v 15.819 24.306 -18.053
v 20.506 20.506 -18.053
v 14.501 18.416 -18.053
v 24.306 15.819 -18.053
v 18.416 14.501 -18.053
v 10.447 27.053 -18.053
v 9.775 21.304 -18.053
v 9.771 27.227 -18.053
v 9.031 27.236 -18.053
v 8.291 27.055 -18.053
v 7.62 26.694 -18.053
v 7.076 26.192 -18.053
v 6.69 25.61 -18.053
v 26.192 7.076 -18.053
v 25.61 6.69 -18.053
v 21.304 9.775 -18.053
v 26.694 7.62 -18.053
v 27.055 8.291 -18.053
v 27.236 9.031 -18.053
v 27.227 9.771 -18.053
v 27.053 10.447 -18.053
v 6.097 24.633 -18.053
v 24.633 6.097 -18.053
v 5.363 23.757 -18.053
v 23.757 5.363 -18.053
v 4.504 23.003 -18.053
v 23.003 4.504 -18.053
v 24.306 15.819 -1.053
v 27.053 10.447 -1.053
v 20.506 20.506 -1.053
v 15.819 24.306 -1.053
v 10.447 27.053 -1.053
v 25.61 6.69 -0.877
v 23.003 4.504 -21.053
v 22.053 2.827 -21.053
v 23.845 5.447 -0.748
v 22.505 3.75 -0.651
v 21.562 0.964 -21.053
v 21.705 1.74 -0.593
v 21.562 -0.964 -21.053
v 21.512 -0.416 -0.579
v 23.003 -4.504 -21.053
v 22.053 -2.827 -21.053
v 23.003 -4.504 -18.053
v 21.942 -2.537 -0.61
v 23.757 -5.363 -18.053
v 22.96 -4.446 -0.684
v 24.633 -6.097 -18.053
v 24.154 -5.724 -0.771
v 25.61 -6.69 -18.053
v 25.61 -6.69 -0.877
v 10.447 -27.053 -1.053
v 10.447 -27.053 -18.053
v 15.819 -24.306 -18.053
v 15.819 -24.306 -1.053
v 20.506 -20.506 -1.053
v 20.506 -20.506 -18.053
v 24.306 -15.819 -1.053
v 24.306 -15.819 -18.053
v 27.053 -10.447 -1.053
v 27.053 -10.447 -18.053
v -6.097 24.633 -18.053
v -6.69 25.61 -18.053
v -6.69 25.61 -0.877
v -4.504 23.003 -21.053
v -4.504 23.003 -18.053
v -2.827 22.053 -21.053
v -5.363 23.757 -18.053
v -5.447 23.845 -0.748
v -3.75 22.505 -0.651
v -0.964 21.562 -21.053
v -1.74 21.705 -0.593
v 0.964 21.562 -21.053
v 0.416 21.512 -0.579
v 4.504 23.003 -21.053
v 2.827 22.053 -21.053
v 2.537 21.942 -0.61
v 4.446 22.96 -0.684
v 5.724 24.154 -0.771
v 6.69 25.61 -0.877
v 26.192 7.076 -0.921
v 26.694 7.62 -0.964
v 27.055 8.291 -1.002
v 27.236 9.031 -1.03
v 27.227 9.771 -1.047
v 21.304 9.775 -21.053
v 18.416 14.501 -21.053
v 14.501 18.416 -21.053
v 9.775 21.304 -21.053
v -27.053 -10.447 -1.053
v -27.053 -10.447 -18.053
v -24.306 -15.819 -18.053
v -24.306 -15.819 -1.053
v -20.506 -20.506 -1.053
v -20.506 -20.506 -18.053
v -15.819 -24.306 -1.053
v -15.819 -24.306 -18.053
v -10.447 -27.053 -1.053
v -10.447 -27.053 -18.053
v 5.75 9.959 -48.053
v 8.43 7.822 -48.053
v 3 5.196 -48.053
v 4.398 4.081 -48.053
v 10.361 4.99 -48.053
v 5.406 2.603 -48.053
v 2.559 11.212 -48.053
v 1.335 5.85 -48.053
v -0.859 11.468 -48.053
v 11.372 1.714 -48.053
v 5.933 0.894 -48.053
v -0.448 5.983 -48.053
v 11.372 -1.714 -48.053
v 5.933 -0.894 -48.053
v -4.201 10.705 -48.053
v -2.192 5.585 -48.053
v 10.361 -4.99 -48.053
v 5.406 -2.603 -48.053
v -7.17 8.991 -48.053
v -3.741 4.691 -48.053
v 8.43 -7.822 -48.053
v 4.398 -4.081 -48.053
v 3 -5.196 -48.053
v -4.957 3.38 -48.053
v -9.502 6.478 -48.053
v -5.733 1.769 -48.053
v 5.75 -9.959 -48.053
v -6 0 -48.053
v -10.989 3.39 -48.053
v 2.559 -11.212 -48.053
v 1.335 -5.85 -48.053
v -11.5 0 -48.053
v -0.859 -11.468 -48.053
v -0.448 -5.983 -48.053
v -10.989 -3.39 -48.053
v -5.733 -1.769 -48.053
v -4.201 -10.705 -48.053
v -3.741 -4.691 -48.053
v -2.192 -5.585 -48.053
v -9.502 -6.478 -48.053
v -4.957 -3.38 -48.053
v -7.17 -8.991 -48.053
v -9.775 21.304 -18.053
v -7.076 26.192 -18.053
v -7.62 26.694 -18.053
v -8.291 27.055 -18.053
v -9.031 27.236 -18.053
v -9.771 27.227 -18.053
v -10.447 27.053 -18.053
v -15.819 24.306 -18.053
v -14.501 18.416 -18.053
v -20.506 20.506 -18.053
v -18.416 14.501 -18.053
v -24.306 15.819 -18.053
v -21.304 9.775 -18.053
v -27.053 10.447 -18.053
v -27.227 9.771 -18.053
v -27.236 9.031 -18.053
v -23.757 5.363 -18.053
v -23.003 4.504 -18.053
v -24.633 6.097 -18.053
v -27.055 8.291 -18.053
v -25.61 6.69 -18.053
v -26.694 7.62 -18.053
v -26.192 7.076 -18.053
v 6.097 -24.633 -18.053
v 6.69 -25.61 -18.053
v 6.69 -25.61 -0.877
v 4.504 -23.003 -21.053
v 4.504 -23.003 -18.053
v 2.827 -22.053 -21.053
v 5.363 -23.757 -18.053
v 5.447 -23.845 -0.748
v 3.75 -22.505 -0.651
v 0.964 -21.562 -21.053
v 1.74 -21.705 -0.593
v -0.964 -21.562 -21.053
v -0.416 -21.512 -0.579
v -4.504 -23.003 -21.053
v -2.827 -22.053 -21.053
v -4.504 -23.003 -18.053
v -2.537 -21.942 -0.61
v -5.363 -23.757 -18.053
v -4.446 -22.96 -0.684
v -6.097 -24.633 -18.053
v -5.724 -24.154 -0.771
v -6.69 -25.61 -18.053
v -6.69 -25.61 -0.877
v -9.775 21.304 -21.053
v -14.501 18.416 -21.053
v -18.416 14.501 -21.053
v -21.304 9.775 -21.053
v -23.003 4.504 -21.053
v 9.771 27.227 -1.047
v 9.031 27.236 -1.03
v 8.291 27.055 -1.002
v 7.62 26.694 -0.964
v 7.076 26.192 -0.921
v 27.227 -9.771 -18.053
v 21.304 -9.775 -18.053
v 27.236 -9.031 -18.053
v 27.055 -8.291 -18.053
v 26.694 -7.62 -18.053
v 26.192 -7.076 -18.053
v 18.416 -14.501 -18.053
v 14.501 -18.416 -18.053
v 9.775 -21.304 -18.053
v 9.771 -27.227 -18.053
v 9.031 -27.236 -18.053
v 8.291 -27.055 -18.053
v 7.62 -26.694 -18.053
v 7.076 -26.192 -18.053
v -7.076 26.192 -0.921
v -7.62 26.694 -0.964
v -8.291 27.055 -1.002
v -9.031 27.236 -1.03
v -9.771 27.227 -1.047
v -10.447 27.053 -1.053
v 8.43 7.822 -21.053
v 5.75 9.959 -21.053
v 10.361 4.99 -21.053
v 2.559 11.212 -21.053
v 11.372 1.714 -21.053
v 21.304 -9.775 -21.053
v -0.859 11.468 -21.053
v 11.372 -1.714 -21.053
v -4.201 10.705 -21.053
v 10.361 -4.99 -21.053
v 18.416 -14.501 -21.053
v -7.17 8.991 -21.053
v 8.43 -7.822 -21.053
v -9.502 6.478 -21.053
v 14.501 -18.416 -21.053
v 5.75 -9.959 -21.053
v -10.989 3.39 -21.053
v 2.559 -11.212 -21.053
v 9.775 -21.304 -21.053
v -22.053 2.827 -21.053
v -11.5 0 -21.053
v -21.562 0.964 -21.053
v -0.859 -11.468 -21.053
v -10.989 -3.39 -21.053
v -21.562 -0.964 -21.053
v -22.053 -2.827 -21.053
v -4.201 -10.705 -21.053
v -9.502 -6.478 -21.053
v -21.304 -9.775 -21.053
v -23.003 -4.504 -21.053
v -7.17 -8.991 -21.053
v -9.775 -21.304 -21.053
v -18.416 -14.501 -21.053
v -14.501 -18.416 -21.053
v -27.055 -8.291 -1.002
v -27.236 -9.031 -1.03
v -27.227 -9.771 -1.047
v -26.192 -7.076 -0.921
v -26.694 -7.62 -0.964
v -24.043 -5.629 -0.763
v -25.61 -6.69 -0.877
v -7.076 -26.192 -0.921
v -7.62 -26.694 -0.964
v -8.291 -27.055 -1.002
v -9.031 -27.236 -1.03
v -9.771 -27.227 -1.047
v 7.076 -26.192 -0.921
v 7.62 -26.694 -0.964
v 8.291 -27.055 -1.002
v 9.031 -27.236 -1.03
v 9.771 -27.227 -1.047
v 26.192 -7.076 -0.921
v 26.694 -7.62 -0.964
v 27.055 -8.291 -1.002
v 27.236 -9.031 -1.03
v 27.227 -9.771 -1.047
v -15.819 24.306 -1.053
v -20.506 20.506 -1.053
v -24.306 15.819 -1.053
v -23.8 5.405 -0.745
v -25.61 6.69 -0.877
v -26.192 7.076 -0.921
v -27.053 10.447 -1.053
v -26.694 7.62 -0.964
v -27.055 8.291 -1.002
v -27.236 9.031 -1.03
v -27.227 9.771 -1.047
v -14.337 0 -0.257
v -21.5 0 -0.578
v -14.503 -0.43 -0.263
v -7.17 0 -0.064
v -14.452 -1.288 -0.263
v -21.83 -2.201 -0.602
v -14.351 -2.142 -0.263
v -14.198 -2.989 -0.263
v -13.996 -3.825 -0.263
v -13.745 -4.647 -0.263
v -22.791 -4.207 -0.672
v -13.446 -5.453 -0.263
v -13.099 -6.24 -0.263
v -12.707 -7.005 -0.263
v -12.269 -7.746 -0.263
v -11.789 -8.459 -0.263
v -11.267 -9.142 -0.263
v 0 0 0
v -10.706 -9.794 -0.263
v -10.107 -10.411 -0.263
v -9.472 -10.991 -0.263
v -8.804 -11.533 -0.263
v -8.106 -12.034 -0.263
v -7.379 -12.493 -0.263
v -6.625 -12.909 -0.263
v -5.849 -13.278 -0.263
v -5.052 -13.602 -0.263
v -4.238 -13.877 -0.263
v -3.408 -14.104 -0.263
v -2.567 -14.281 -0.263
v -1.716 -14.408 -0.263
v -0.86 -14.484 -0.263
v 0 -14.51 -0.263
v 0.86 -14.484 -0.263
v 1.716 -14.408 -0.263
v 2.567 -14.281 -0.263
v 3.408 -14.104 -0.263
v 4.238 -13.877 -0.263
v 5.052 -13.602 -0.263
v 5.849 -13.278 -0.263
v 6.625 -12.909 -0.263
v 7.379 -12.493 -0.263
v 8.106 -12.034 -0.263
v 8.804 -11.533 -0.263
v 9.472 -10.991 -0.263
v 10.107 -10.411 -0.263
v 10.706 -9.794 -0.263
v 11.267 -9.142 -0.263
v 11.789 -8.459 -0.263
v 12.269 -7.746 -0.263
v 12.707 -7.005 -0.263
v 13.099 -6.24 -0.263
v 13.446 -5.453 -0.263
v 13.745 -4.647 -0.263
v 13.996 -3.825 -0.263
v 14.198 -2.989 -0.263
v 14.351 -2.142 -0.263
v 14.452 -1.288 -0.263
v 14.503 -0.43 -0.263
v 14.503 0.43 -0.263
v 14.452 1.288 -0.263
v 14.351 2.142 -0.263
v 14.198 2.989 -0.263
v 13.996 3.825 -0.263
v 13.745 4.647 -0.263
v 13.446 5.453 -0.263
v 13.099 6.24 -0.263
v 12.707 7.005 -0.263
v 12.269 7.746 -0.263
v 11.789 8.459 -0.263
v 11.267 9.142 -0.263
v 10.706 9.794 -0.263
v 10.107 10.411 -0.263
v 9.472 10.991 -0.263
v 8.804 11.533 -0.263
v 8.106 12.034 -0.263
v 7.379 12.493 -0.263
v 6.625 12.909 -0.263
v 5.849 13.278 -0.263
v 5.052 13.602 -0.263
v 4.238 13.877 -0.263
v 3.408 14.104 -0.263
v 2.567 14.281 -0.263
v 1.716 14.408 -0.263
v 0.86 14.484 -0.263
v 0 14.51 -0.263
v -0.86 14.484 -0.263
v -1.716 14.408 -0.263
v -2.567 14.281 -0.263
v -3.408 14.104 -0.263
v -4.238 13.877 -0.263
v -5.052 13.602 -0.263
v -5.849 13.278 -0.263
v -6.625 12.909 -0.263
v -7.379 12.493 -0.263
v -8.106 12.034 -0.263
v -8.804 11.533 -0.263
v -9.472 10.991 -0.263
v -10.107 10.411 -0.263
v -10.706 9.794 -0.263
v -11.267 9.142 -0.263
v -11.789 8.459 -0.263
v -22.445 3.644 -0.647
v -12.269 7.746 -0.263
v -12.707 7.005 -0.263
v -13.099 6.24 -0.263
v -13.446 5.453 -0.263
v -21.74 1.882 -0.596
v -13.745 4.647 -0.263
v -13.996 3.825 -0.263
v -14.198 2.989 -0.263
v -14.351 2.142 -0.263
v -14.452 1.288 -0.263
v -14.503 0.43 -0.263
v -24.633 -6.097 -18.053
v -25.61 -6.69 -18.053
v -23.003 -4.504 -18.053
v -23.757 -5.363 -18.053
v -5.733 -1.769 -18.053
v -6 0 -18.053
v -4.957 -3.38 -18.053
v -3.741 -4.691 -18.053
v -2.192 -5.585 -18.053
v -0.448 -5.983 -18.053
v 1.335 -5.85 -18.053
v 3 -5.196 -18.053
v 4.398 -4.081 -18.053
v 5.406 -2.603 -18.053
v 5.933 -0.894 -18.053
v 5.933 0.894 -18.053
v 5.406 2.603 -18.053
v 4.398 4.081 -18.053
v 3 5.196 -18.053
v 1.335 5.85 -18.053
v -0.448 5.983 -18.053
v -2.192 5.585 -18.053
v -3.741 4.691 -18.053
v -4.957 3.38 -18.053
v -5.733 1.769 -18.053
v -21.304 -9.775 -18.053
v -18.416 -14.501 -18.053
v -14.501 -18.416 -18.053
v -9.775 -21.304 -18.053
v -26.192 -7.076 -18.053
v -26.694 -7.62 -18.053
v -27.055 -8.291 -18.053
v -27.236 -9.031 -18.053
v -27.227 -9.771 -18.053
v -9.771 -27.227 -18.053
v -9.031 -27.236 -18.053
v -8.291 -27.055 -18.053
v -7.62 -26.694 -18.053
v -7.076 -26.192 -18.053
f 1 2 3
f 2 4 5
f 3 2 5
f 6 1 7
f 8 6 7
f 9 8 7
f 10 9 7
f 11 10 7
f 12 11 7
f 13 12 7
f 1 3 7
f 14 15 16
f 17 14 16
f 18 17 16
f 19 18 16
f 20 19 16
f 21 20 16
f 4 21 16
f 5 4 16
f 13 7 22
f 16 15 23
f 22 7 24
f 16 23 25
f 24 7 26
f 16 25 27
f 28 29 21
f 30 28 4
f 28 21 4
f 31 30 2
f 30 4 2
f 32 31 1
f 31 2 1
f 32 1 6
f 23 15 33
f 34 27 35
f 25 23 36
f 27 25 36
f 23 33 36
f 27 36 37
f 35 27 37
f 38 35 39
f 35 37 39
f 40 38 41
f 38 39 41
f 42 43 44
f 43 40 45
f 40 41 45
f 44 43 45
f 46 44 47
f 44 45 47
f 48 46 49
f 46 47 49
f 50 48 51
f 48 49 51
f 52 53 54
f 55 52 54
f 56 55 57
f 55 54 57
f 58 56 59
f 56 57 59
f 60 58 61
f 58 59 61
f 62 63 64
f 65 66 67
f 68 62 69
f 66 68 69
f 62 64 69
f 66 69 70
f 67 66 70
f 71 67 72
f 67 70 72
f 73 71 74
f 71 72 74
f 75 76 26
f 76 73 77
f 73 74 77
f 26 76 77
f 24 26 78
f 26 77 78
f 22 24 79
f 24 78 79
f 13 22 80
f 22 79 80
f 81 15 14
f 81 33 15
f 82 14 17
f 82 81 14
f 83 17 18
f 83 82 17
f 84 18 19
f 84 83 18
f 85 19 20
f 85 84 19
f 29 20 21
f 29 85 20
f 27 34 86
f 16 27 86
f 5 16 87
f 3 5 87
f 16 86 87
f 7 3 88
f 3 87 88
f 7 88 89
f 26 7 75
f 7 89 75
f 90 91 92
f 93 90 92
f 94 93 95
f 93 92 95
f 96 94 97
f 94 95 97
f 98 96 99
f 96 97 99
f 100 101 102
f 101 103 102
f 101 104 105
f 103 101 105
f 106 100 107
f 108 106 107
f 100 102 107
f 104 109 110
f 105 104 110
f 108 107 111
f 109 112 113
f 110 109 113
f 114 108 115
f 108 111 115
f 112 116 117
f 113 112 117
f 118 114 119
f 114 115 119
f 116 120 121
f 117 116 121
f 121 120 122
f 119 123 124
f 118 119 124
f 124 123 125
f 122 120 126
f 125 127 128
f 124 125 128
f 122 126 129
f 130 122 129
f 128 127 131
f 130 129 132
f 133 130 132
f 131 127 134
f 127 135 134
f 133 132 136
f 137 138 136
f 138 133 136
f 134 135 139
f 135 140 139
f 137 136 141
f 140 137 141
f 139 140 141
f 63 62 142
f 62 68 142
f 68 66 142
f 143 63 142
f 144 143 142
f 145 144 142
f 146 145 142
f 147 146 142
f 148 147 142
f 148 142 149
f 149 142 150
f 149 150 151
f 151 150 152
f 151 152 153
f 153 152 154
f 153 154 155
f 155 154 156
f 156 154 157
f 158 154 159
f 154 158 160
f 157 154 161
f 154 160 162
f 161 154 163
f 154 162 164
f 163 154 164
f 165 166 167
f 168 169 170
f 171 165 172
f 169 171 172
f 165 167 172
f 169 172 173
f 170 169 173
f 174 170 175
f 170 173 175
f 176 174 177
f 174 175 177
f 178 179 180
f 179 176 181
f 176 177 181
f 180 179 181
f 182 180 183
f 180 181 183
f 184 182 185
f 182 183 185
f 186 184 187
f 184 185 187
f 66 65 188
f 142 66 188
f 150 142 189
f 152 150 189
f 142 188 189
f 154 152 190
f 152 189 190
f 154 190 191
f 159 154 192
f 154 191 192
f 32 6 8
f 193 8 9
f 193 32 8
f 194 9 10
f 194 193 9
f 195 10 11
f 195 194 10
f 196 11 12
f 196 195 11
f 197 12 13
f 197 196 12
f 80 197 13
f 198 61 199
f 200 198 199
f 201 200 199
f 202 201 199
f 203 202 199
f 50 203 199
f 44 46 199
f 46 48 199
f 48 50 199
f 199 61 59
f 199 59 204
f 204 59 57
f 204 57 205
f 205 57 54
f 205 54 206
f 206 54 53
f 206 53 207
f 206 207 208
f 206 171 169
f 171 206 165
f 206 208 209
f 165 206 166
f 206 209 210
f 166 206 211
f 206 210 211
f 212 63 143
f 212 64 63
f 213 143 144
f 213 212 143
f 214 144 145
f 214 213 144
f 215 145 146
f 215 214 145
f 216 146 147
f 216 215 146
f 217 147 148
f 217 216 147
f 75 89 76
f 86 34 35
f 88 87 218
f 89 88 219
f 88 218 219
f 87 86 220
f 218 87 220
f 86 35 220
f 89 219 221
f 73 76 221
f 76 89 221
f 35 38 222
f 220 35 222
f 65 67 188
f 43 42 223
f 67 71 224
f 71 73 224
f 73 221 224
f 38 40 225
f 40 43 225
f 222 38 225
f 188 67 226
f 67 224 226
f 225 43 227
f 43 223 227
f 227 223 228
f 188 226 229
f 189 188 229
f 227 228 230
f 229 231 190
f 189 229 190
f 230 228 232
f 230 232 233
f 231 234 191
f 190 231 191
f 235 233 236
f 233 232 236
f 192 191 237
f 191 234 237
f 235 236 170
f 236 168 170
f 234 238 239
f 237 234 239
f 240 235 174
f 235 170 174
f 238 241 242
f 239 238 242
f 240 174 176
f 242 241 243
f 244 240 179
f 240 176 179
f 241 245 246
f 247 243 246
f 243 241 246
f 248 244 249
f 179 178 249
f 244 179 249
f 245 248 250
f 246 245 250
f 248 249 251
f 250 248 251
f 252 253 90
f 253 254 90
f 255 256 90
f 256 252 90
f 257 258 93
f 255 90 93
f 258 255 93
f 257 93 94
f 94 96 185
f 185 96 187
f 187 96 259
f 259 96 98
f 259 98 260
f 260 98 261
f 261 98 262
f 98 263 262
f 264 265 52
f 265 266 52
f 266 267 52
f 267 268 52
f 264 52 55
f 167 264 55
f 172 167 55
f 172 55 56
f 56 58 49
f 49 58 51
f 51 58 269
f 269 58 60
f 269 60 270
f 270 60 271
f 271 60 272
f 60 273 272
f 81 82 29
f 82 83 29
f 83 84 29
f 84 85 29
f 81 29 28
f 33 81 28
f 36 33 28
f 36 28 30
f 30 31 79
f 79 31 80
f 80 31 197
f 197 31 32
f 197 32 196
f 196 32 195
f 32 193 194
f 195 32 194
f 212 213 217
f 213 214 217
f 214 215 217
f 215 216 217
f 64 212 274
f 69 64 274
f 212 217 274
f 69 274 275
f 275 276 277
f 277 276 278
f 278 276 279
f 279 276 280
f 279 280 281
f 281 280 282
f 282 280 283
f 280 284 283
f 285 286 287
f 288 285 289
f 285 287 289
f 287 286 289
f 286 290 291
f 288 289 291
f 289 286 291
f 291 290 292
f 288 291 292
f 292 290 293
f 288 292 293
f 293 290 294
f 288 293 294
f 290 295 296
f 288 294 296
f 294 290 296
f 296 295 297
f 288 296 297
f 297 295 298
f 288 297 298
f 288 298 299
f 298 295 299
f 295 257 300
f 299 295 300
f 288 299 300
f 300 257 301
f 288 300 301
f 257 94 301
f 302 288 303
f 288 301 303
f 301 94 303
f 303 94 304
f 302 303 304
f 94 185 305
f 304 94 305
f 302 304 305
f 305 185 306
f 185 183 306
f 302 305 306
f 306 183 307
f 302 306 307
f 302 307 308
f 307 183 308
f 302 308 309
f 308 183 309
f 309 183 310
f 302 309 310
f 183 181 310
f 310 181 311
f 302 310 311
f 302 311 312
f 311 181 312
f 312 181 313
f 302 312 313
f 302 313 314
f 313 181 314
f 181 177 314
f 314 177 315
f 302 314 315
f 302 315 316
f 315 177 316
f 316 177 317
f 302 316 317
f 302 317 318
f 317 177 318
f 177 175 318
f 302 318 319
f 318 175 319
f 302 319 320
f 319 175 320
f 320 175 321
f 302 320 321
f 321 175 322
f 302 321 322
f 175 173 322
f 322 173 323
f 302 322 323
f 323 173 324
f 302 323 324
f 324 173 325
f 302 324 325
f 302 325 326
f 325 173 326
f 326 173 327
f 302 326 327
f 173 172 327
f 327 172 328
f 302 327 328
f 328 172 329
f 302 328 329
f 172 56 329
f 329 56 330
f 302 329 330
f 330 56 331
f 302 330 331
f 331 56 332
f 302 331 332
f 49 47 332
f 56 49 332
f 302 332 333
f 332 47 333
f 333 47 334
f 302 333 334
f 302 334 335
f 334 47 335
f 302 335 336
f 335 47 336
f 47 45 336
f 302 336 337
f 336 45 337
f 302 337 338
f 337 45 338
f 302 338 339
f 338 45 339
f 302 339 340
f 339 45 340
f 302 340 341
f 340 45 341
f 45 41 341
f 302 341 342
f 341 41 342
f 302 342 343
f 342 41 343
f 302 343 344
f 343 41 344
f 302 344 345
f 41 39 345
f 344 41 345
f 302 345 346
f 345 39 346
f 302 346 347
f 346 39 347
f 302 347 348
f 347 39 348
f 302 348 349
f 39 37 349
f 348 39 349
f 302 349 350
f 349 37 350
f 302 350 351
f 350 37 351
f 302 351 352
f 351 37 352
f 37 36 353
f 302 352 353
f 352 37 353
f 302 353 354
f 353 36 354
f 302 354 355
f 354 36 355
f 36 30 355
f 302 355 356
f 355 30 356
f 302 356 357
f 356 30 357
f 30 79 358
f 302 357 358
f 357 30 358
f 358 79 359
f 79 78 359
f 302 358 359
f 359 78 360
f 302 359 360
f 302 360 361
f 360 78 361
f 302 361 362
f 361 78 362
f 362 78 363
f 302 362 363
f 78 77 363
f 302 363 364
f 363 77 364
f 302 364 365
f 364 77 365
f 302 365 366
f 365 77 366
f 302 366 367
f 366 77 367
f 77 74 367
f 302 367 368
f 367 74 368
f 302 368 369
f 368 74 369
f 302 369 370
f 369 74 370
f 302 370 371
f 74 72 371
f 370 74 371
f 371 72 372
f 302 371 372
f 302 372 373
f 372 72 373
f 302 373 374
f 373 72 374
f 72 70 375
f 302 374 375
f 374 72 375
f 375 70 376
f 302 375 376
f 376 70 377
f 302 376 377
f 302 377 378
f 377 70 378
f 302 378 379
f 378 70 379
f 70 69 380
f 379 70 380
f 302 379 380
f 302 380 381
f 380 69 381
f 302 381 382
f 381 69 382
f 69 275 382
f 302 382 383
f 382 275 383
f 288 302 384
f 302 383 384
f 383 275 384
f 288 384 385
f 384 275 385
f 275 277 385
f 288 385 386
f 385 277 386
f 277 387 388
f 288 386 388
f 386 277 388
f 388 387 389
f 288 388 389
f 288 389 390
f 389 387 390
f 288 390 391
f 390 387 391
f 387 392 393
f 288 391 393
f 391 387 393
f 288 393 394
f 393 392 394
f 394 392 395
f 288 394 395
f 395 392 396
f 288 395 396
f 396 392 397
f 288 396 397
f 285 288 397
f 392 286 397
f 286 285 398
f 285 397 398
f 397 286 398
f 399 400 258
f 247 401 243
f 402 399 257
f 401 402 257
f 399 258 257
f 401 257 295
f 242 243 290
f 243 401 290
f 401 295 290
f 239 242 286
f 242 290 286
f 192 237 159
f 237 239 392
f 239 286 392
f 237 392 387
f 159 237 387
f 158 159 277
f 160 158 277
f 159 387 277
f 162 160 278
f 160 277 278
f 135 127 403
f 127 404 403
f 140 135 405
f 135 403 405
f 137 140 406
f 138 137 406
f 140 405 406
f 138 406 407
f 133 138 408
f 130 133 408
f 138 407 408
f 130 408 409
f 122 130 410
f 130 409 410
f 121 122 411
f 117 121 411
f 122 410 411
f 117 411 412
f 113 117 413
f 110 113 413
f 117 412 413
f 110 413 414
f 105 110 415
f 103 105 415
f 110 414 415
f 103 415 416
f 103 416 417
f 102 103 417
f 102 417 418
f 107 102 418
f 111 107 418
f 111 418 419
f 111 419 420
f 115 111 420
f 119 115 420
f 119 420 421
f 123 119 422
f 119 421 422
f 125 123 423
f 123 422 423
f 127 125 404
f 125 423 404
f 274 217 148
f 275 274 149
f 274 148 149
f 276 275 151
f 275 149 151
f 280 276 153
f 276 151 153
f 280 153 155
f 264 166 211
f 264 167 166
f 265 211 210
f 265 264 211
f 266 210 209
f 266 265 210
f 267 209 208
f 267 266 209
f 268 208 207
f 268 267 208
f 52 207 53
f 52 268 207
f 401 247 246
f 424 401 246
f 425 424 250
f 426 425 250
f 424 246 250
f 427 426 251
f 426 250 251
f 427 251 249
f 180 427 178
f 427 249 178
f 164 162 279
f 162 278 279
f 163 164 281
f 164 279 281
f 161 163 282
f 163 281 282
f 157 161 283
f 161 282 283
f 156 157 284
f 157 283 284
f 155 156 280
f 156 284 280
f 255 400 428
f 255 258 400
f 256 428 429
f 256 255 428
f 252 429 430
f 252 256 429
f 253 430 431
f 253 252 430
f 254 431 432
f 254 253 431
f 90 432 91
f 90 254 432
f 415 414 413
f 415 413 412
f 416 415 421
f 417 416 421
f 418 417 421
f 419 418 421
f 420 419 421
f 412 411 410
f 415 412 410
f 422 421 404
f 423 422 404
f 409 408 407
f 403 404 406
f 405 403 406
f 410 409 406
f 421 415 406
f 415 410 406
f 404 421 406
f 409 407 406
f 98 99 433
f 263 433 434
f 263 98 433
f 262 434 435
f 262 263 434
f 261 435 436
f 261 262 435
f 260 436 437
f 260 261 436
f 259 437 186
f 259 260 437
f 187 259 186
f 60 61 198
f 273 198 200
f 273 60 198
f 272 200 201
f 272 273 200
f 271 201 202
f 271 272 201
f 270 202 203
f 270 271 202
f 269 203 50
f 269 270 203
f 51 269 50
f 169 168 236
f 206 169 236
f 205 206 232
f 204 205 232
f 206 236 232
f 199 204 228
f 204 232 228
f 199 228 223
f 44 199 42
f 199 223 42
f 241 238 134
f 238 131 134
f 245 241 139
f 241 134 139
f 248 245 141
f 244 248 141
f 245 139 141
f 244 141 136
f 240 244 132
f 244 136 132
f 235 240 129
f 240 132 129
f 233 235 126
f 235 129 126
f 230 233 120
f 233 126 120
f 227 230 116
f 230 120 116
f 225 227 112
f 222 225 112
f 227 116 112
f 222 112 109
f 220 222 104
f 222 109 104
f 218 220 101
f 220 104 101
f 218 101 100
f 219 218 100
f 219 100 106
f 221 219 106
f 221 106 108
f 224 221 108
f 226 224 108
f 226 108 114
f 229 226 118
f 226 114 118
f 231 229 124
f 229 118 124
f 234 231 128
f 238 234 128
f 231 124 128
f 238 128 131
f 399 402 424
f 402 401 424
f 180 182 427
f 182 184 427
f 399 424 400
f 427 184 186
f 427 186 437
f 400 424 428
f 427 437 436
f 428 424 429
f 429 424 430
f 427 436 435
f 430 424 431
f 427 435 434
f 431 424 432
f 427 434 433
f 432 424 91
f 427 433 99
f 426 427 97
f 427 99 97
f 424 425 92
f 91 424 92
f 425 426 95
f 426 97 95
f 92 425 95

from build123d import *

# Parameters (mm, degrees)
CUT_EXTRUDE1_REACH = 50.053
SKETCH2_R          = 7.5
FILLET1_R          = 3


with BuildPart() as part:
    # Sketch1 → Revolve1 (revolve)
    with BuildSketch(Plane(origin=(0, 0, 0), x_dir=(1, 0, 0), z_dir=(0, 1, 0))):
        with BuildLine():
            Line((0, 18.052635051), (0, 0))
            ThreePointArc((0, 0), (-14.509548929, 0.263245385), (-29, 1.052635051))
            Line((-29, 1.052635051), (-29, 18.052635051))
            Line((-29, 18.052635051), (-23.44, 18.052635051))
            Line((-23.44, 18.052635051), (-23.44, 21.052635051))
            Line((-23.44, 21.052635051), (-11.5, 21.052635051))
            Line((-11.5, 21.052635051), (-11.5, 48.052635051))
            Line((-11.5, 48.052635051), (-6, 48.052635051))
            Line((-6, 48.052635051), (-6, 18.052635051))
            Line((-6, 18.052635051), (0, 18.052635051))
        make_face()
    revolve(axis=Axis((0, 0, -358.843484937), (0, 0, 1)))

    # Sketch2 → Cut-Extrude1 (cut, up to next)
    with BuildSketch(Plane.XY, mode=Mode.PRIVATE) as cut_extrude1_sk1:
        with Locations((0, 29)):
            Circle(SKETCH2_R)
    cut_extrude1_tool1 = extrude(cut_extrude1_sk1.sketch, amount=-CUT_EXTRUDE1_REACH, mode=Mode.PRIVATE) & part.part
    add(cut_extrude1_tool1.solids().sort_by_distance((0, 29, 0))[0], mode=Mode.SUBTRACT)
    # Sketch2 → Cut-Extrude1 (cut, up to next)
    with BuildSketch(Plane.XY, mode=Mode.PRIVATE) as cut_extrude1_sk2:
        with Locations((29, 0)):
            Circle(SKETCH2_R)
    cut_extrude1_tool2 = extrude(cut_extrude1_sk2.sketch, amount=-CUT_EXTRUDE1_REACH, mode=Mode.PRIVATE) & part.part
    add(cut_extrude1_tool2.solids().sort_by_distance((29, 0, 0))[0], mode=Mode.SUBTRACT)
    # Sketch2 → Cut-Extrude1 (cut, up to next)
    with BuildSketch(Plane.XY, mode=Mode.PRIVATE) as cut_extrude1_sk3:
        with Locations((0, -29)):
            Circle(SKETCH2_R)
    cut_extrude1_tool3 = extrude(cut_extrude1_sk3.sketch, amount=-CUT_EXTRUDE1_REACH, mode=Mode.PRIVATE) & part.part
    add(cut_extrude1_tool3.solids().sort_by_distance((0, -29, 0))[0], mode=Mode.SUBTRACT)
    # Sketch2 → Cut-Extrude1 (cut, up to next)
    with BuildSketch(Plane.XY, mode=Mode.PRIVATE) as cut_extrude1_sk4:
        with Locations((-29, 0)):
            Circle(SKETCH2_R)
    cut_extrude1_tool4 = extrude(cut_extrude1_sk4.sketch, amount=-CUT_EXTRUDE1_REACH, mode=Mode.PRIVATE) & part.part
    add(cut_extrude1_tool4.solids().sort_by_distance((-29, 0, 0))[0], mode=Mode.SUBTRACT)

    # Fillet1
    fillet1_edges = [part.edges().sort_by_distance(p)[0] for p in [
        (-28.030172414, -7.437031293, -9.552634751),
        (-28.030172414, 7.437031293, -9.552635051),
        (7.437031293, -28.030172414, -9.552635051),
        (-7.437031293, -28.030172414, -9.552635051),
        (28.030172414, 7.437031293, -9.552635051),
        (28.030172414, -7.437031293, -9.552635051),
        (-7.437031293, 28.030172414, -9.552635051),
        (7.437031293, 28.030172414, -9.552635051),
    ]]
    fillet(fillet1_edges, radius=FILLET1_R)


solid = part.part
